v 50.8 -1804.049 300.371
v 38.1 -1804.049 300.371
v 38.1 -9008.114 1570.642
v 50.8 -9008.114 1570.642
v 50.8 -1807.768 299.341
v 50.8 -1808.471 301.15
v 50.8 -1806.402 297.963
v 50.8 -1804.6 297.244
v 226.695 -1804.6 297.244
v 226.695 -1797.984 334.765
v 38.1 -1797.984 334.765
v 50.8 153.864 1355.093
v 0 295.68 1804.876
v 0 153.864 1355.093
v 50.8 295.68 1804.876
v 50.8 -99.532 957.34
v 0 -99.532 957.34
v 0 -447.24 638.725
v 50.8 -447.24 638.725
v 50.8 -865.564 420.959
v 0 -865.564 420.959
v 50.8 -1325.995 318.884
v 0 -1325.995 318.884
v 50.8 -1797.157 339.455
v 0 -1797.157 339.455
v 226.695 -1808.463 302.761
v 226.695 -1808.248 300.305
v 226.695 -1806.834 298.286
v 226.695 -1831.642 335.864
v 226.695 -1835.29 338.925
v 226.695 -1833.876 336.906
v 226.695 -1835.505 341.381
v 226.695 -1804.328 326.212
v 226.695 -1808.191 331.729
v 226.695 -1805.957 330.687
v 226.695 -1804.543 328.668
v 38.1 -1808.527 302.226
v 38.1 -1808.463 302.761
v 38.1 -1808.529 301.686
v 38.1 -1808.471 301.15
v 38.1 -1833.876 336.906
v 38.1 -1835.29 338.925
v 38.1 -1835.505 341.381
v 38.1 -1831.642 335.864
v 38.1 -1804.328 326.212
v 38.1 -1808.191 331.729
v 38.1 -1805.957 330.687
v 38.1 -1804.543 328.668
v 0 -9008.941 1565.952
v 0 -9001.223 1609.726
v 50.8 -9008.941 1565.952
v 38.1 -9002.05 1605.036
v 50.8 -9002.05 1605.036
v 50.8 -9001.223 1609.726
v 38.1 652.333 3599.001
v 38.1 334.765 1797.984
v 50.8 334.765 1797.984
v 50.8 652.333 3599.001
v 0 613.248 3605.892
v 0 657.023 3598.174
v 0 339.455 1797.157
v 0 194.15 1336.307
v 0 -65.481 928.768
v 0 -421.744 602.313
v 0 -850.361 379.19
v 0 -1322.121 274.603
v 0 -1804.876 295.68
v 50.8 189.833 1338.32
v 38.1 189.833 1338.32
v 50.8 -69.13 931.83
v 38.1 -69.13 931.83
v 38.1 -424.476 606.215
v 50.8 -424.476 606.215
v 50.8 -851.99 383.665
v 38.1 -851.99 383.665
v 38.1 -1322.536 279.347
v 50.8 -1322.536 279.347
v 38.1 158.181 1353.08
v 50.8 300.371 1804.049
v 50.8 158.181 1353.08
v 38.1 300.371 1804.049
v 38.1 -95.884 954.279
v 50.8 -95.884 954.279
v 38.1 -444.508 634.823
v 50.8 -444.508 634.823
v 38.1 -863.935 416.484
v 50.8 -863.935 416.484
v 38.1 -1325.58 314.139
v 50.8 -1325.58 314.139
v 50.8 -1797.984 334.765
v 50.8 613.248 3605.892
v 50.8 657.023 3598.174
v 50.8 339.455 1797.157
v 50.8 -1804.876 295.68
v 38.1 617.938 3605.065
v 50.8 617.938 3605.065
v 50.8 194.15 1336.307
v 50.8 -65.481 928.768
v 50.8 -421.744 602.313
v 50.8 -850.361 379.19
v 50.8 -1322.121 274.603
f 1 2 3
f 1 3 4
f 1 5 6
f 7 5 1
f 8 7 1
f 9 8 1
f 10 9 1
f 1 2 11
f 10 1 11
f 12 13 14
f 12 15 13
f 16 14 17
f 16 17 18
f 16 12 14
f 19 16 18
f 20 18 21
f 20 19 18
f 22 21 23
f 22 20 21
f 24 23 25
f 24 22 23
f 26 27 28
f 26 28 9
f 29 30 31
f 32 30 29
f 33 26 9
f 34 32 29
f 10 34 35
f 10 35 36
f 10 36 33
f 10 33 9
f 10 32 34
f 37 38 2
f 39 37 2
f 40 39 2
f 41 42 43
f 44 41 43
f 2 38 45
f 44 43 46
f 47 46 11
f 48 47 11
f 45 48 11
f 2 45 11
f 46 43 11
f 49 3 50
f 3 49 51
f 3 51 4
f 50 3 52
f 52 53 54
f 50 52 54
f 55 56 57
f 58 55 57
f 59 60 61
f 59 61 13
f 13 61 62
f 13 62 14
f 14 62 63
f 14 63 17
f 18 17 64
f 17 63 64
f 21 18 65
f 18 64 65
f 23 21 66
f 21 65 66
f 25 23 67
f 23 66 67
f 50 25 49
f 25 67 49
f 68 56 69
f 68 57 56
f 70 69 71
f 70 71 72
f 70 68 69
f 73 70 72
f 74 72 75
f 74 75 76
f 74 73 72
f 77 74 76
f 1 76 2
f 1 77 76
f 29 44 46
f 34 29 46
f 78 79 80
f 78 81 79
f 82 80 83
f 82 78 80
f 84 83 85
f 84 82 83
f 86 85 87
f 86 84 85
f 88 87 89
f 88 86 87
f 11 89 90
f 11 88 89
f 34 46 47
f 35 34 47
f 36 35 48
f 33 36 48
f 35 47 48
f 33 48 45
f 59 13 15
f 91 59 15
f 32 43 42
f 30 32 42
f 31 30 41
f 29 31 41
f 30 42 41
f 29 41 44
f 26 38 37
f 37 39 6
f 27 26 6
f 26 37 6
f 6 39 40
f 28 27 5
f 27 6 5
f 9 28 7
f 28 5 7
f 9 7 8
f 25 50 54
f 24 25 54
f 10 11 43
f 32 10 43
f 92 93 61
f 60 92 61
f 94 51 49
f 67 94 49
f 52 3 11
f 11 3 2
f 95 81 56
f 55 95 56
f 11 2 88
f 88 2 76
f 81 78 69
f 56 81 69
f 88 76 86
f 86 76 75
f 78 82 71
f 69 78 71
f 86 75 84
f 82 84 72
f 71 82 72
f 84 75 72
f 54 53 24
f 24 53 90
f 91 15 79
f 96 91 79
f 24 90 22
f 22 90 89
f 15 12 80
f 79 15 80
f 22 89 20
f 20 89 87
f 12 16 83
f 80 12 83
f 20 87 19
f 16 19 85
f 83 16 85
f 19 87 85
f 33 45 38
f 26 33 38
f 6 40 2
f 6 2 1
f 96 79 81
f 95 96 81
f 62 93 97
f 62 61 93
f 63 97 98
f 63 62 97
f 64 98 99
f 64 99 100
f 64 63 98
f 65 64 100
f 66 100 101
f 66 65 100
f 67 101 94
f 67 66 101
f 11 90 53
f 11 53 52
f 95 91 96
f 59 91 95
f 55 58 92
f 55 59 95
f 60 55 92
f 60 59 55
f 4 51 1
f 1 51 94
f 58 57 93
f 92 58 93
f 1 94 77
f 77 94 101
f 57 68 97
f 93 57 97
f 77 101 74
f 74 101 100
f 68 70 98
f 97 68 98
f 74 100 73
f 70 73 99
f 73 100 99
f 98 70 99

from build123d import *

# Parameters (mm, degrees)
F3_W     = 38.1
F3_H     = 34.925
F6_DEPTH = 188.595


with BuildPart() as f4:
    # F4: sweep along a path in F1
    with BuildLine(Plane.YZ) as f4_path:
        Line((635.135575, 3602.032837), (317.567787, 1801.016419))
        ThreePointArc((317.567787, 1801.016419), (-434.492045, 620.518947), (-1801.016419, 317.567787))
        Line((-1801.016419, 317.567787), (-9005.082094, 1587.838937))
    # F3 (on face) → F4 (sweep)
    with BuildSketch(Plane(origin=(0, 635.135575, 3602.032837), x_dir=(1, 0, 0), z_dir=(0, 0.173648, 0.984808))):
        with Locations((19.05, 0)):
            Rectangle(F3_W, F3_H)
        Polygon((38.1, -17.4625), (0, -17.4625), (0, -22.225), (50.8, -22.225), (50.8, -17.4625), align=None)
        Polygon((0, 22.225), (0, 17.4625), (38.1, 17.4625), (50.8, 17.4625), (50.8, 22.225), align=None)
    sweep(path=f4_path.line)


with BuildPart() as f6:
    # F5 (on face) → F6 (new body, through all)
    with BuildSketch(Plane.YZ.offset(38.1)):
        with BuildLine():
            Line((-1804.600083, 297.243817), (-1797.984087, 334.764993))
            Line((-1797.984087, 334.764993), (-1835.505263, 341.380988))
            ThreePointArc((-1835.505263, 341.380988), (-1834.716327, 337.822331), (-1831.642115, 335.863842))
            Line((-1831.642115, 335.863842), (-1808.191381, 331.728845))
            ThreePointArc((-1808.191381, 331.728845), (-1805.117169, 329.770356), (-1804.328233, 326.211698))
            Line((-1804.328233, 326.211698), (-1808.46323, 302.760964))
            ThreePointArc((-1808.46323, 302.760964), (-1807.674295, 299.202306), (-1804.600083, 297.243817))
        make_face()
    extrude(amount=F6_DEPTH)

    # F7: cut F4
    add(f4.part, mode=Mode.SUBTRACT)


solid = Compound([f4.part, f6.part])
